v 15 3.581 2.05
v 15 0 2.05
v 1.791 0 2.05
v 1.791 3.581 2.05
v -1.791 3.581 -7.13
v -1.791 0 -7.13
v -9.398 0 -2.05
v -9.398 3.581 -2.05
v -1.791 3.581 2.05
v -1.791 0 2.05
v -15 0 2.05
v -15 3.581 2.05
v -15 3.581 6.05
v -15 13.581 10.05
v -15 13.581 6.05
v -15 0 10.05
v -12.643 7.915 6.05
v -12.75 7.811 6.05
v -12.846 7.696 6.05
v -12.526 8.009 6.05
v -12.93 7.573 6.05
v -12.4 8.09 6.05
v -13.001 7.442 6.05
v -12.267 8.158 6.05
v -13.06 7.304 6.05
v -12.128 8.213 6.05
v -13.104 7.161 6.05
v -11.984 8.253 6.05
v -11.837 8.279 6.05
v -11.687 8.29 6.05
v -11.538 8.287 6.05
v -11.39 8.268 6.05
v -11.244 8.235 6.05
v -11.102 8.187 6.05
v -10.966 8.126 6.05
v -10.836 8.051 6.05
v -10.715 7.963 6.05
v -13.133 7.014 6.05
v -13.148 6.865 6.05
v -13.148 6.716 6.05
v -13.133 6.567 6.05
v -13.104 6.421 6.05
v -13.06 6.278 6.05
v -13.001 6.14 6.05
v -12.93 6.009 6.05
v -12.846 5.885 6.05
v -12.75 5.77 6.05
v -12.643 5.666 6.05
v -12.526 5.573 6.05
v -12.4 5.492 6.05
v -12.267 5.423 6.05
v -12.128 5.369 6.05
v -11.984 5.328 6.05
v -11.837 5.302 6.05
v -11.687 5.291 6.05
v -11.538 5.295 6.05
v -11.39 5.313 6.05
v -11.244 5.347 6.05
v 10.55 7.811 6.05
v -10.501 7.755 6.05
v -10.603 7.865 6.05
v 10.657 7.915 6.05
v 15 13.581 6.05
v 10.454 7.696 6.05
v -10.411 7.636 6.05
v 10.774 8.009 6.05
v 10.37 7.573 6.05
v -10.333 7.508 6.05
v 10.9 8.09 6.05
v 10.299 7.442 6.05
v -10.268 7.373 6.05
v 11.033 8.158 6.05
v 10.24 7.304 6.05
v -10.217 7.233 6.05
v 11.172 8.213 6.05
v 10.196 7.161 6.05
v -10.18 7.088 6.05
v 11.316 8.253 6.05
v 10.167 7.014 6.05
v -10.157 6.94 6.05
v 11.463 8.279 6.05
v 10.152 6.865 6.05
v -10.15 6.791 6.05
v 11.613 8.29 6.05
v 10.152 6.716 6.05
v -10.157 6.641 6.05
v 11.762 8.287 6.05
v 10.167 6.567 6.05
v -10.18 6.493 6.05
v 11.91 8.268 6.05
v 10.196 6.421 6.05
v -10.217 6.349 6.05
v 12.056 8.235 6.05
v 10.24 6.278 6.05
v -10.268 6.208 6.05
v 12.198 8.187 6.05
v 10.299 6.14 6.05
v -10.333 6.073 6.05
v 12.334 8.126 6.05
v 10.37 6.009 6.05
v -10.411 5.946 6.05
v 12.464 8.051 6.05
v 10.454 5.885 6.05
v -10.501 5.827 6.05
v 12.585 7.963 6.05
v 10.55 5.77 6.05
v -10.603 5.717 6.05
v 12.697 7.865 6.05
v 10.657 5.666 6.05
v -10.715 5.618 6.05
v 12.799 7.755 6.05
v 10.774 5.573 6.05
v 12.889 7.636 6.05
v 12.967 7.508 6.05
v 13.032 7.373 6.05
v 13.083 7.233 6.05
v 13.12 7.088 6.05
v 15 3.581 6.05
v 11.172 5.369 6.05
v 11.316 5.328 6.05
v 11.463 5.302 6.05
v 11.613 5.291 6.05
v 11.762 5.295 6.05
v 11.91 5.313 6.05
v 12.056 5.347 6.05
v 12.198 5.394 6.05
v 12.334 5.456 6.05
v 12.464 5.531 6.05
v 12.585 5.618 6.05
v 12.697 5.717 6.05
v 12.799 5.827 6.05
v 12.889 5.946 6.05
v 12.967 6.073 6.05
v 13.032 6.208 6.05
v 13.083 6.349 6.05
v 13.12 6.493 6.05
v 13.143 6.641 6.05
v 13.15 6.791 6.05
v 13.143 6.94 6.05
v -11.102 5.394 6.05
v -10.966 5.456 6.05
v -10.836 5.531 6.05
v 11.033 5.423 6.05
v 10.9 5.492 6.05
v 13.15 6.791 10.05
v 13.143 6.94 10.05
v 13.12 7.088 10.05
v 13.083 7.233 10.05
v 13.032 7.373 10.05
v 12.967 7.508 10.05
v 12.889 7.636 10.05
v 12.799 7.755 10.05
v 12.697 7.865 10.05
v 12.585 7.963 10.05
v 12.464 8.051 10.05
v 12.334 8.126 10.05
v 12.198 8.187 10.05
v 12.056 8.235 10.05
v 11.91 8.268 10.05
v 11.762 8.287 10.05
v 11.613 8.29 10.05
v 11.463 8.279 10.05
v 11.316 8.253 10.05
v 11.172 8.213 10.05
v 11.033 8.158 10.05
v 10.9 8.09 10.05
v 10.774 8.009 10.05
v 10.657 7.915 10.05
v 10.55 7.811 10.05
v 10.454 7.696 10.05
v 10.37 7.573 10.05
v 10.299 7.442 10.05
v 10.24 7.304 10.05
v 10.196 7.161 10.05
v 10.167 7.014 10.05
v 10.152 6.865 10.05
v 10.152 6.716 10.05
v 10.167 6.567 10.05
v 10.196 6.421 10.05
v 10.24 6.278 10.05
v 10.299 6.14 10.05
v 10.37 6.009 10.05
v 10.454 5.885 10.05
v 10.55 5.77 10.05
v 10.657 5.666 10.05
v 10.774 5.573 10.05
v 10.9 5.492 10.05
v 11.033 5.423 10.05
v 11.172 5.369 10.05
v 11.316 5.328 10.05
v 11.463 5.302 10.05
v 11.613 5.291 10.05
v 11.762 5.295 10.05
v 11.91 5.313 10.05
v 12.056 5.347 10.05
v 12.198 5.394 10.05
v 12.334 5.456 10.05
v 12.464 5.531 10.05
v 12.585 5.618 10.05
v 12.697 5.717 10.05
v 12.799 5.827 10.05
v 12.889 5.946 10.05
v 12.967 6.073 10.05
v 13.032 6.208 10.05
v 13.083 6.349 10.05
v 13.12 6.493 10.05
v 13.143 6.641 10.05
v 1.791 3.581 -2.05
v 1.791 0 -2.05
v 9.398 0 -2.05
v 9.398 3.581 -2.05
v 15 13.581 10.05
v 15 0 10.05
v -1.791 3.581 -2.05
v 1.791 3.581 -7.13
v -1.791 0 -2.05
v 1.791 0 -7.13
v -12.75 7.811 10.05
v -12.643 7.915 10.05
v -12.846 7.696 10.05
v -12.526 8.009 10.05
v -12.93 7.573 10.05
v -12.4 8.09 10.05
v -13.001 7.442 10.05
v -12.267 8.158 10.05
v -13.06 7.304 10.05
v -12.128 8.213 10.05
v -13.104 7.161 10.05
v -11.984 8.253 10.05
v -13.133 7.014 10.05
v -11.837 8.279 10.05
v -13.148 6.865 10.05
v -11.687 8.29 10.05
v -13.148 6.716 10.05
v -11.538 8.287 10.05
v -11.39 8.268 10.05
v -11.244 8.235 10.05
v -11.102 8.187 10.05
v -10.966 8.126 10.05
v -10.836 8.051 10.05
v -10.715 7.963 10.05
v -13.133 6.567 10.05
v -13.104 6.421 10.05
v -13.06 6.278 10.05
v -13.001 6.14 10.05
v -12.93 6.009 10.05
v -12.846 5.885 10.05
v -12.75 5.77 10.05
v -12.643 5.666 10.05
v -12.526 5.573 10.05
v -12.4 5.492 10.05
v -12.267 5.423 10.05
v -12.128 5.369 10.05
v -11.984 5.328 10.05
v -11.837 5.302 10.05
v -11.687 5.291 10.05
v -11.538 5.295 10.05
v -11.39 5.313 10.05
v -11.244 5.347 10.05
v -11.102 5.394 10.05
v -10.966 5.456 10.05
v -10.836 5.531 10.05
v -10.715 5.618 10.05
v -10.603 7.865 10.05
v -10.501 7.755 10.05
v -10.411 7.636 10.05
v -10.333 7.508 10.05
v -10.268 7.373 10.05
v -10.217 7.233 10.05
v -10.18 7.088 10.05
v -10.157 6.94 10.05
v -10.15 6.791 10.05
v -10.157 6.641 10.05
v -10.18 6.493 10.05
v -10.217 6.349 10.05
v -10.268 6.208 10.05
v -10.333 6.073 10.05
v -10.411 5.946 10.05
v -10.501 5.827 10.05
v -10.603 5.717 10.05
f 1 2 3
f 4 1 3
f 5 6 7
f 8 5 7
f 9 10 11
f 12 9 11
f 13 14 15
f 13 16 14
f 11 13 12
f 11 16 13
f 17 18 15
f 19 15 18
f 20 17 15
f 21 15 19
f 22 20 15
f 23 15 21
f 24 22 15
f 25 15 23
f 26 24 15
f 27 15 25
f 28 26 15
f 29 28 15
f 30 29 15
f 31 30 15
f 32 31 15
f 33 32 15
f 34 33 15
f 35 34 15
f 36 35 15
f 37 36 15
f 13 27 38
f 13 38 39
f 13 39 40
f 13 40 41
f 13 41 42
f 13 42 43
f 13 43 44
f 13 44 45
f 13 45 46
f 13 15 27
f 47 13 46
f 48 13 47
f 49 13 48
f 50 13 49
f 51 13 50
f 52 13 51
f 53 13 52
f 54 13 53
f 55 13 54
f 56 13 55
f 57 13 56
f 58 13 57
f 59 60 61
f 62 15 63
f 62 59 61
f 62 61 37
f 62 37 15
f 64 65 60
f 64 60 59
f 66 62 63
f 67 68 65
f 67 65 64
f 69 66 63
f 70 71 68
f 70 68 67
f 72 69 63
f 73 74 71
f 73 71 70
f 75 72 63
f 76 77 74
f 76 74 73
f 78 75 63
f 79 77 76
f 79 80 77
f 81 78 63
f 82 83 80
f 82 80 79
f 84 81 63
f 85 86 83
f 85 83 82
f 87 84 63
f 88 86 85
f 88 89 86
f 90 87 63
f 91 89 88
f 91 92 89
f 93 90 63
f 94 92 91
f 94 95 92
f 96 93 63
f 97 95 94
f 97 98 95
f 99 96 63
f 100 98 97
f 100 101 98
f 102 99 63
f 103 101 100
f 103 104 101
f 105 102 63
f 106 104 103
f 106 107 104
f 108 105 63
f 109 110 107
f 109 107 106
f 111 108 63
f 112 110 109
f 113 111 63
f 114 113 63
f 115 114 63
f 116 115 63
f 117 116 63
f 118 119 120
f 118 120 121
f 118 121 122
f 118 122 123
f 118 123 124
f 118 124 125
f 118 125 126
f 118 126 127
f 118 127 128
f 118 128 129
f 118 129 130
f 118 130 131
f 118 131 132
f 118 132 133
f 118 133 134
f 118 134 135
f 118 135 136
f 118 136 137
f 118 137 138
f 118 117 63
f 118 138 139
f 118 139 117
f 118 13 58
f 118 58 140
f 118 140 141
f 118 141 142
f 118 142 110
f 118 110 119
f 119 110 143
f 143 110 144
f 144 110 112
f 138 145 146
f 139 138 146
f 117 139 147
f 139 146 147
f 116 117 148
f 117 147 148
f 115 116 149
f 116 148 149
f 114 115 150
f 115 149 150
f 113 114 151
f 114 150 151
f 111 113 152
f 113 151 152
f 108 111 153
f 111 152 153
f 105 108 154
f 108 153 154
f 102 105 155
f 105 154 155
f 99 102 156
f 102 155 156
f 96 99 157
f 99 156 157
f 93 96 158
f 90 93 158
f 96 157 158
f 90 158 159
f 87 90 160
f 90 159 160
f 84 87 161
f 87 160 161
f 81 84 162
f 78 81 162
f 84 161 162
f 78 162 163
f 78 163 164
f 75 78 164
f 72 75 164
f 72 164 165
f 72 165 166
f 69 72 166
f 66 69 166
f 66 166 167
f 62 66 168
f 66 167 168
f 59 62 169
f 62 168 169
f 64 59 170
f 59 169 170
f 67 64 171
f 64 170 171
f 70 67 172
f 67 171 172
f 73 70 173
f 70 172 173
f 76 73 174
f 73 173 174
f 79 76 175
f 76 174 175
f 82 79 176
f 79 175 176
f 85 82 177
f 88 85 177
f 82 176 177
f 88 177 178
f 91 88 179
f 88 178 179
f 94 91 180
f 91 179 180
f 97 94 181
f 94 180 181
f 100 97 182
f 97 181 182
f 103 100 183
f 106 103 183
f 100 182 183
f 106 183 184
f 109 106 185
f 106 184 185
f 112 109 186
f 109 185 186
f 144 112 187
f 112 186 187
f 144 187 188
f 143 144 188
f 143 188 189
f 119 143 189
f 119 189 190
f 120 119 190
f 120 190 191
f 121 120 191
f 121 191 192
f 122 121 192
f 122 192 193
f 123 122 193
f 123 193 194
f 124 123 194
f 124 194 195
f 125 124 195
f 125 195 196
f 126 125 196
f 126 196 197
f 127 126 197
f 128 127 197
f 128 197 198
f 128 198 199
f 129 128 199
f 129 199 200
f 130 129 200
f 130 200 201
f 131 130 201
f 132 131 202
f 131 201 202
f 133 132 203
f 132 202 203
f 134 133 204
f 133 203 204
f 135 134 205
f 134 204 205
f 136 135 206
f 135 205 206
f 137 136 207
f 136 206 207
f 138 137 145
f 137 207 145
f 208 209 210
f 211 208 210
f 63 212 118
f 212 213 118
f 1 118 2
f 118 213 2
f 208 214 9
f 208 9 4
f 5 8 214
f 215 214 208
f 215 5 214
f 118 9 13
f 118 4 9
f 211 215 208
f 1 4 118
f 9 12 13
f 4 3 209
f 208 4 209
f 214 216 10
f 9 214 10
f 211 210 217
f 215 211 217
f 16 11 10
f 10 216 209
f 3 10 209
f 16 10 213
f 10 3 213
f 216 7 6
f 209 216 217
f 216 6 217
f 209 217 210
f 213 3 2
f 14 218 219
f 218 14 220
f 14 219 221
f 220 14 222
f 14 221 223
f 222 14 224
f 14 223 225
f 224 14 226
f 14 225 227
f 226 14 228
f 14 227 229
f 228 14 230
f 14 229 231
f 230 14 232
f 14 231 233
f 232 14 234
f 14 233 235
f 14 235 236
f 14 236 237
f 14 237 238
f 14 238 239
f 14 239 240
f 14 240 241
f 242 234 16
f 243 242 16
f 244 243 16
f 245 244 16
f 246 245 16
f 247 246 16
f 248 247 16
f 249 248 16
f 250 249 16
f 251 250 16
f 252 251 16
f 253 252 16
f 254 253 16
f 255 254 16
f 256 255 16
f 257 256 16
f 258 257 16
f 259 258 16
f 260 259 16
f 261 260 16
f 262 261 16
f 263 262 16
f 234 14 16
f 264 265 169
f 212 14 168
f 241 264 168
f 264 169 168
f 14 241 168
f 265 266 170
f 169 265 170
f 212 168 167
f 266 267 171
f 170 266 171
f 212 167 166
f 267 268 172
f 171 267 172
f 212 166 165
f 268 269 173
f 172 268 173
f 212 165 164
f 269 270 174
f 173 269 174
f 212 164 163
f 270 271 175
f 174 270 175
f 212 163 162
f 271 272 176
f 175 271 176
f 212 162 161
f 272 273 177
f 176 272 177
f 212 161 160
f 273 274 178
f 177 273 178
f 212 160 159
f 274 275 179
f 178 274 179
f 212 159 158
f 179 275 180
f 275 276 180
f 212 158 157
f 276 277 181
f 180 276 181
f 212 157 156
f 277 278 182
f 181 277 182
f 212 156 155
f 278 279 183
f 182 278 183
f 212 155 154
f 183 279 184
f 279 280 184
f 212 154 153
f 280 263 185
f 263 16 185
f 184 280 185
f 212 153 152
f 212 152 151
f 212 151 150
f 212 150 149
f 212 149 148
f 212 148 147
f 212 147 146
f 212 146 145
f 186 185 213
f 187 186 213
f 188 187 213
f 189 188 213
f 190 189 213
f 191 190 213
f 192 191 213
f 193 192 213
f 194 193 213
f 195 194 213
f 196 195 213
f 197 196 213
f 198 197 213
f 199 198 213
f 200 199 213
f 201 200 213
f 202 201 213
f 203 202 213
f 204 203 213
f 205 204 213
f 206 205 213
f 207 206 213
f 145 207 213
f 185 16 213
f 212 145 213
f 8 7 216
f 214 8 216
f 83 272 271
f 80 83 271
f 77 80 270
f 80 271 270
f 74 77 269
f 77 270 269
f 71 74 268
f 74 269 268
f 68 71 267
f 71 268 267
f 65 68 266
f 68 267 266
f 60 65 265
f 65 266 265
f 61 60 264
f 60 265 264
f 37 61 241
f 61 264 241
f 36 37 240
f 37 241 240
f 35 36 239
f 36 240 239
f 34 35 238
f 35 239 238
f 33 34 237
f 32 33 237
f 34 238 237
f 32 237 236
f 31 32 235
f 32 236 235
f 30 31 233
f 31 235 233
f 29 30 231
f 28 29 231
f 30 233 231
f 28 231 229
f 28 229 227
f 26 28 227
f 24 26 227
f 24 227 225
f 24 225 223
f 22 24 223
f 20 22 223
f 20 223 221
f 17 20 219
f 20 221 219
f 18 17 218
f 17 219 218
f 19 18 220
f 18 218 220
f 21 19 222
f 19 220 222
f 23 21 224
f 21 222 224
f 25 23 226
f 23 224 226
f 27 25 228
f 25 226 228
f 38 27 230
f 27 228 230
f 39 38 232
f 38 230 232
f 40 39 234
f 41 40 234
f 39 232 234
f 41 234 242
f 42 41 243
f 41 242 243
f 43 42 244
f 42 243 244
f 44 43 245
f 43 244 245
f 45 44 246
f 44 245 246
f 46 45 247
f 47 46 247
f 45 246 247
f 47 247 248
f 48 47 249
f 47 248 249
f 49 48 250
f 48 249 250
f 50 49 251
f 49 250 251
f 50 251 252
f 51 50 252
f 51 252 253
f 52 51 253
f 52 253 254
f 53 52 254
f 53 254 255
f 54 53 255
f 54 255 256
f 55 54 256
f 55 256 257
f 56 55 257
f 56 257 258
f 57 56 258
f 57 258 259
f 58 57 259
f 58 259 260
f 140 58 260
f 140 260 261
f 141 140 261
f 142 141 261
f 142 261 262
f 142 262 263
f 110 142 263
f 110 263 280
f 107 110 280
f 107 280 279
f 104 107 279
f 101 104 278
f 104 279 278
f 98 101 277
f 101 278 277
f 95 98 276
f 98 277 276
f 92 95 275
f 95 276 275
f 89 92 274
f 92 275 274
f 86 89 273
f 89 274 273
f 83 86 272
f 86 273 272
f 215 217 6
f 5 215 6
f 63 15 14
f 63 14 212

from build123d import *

# Parameters (mm, degrees)
BOSS_EXTRUDE1_DEPTH = 3.5814
SKETCH2_W           = 30
SKETCH2_H           = 4
BOSS_EXTRUDE2_DEPTH = 10
SKETCH3_R           = 1.5
CUT_EXTRUDE1_DEPTH  = 4


with BuildPart() as part:
    # Sketch1 → Boss-Extrude1 (new body)
    with BuildSketch(Plane(origin=(0, 0, 0), x_dir=(1, 0, 0), z_dir=(0, 1, 0))):
        Polygon((-15, -10.05), (15, -10.05), (15, -2.05), (1.7907, -2.05), (1.7907, 2.05), (9.398, 2.05), (1.7907, 7.13), (-1.7907, 7.13), (-9.398, 2.05), (-1.7907, 2.05), (-1.7907, -2.05), (-15, -2.05), align=None)
    extrude(amount=BOSS_EXTRUDE1_DEPTH)

    # Sketch2 → Boss-Extrude2 (add)
    with BuildSketch(Plane(origin=(0, 3.5814, 0), x_dir=(1, 0, 0), z_dir=(0, 1, 0))):
        with Locations((0, -8.05)):
            Rectangle(SKETCH2_W, SKETCH2_H)
    extrude(amount=BOSS_EXTRUDE2_DEPTH)

    # Sketch3 → Cut-Extrude1 (cut)
    with BuildSketch(Plane.XY.offset(10.05)):
        with Locations((-11.65, 6.7907)):
            Circle(SKETCH3_R)
        with Locations((11.65, 6.7907)):
            Circle(SKETCH3_R)
    extrude(amount=-CUT_EXTRUDE1_DEPTH, mode=Mode.SUBTRACT)


solid = part.part
